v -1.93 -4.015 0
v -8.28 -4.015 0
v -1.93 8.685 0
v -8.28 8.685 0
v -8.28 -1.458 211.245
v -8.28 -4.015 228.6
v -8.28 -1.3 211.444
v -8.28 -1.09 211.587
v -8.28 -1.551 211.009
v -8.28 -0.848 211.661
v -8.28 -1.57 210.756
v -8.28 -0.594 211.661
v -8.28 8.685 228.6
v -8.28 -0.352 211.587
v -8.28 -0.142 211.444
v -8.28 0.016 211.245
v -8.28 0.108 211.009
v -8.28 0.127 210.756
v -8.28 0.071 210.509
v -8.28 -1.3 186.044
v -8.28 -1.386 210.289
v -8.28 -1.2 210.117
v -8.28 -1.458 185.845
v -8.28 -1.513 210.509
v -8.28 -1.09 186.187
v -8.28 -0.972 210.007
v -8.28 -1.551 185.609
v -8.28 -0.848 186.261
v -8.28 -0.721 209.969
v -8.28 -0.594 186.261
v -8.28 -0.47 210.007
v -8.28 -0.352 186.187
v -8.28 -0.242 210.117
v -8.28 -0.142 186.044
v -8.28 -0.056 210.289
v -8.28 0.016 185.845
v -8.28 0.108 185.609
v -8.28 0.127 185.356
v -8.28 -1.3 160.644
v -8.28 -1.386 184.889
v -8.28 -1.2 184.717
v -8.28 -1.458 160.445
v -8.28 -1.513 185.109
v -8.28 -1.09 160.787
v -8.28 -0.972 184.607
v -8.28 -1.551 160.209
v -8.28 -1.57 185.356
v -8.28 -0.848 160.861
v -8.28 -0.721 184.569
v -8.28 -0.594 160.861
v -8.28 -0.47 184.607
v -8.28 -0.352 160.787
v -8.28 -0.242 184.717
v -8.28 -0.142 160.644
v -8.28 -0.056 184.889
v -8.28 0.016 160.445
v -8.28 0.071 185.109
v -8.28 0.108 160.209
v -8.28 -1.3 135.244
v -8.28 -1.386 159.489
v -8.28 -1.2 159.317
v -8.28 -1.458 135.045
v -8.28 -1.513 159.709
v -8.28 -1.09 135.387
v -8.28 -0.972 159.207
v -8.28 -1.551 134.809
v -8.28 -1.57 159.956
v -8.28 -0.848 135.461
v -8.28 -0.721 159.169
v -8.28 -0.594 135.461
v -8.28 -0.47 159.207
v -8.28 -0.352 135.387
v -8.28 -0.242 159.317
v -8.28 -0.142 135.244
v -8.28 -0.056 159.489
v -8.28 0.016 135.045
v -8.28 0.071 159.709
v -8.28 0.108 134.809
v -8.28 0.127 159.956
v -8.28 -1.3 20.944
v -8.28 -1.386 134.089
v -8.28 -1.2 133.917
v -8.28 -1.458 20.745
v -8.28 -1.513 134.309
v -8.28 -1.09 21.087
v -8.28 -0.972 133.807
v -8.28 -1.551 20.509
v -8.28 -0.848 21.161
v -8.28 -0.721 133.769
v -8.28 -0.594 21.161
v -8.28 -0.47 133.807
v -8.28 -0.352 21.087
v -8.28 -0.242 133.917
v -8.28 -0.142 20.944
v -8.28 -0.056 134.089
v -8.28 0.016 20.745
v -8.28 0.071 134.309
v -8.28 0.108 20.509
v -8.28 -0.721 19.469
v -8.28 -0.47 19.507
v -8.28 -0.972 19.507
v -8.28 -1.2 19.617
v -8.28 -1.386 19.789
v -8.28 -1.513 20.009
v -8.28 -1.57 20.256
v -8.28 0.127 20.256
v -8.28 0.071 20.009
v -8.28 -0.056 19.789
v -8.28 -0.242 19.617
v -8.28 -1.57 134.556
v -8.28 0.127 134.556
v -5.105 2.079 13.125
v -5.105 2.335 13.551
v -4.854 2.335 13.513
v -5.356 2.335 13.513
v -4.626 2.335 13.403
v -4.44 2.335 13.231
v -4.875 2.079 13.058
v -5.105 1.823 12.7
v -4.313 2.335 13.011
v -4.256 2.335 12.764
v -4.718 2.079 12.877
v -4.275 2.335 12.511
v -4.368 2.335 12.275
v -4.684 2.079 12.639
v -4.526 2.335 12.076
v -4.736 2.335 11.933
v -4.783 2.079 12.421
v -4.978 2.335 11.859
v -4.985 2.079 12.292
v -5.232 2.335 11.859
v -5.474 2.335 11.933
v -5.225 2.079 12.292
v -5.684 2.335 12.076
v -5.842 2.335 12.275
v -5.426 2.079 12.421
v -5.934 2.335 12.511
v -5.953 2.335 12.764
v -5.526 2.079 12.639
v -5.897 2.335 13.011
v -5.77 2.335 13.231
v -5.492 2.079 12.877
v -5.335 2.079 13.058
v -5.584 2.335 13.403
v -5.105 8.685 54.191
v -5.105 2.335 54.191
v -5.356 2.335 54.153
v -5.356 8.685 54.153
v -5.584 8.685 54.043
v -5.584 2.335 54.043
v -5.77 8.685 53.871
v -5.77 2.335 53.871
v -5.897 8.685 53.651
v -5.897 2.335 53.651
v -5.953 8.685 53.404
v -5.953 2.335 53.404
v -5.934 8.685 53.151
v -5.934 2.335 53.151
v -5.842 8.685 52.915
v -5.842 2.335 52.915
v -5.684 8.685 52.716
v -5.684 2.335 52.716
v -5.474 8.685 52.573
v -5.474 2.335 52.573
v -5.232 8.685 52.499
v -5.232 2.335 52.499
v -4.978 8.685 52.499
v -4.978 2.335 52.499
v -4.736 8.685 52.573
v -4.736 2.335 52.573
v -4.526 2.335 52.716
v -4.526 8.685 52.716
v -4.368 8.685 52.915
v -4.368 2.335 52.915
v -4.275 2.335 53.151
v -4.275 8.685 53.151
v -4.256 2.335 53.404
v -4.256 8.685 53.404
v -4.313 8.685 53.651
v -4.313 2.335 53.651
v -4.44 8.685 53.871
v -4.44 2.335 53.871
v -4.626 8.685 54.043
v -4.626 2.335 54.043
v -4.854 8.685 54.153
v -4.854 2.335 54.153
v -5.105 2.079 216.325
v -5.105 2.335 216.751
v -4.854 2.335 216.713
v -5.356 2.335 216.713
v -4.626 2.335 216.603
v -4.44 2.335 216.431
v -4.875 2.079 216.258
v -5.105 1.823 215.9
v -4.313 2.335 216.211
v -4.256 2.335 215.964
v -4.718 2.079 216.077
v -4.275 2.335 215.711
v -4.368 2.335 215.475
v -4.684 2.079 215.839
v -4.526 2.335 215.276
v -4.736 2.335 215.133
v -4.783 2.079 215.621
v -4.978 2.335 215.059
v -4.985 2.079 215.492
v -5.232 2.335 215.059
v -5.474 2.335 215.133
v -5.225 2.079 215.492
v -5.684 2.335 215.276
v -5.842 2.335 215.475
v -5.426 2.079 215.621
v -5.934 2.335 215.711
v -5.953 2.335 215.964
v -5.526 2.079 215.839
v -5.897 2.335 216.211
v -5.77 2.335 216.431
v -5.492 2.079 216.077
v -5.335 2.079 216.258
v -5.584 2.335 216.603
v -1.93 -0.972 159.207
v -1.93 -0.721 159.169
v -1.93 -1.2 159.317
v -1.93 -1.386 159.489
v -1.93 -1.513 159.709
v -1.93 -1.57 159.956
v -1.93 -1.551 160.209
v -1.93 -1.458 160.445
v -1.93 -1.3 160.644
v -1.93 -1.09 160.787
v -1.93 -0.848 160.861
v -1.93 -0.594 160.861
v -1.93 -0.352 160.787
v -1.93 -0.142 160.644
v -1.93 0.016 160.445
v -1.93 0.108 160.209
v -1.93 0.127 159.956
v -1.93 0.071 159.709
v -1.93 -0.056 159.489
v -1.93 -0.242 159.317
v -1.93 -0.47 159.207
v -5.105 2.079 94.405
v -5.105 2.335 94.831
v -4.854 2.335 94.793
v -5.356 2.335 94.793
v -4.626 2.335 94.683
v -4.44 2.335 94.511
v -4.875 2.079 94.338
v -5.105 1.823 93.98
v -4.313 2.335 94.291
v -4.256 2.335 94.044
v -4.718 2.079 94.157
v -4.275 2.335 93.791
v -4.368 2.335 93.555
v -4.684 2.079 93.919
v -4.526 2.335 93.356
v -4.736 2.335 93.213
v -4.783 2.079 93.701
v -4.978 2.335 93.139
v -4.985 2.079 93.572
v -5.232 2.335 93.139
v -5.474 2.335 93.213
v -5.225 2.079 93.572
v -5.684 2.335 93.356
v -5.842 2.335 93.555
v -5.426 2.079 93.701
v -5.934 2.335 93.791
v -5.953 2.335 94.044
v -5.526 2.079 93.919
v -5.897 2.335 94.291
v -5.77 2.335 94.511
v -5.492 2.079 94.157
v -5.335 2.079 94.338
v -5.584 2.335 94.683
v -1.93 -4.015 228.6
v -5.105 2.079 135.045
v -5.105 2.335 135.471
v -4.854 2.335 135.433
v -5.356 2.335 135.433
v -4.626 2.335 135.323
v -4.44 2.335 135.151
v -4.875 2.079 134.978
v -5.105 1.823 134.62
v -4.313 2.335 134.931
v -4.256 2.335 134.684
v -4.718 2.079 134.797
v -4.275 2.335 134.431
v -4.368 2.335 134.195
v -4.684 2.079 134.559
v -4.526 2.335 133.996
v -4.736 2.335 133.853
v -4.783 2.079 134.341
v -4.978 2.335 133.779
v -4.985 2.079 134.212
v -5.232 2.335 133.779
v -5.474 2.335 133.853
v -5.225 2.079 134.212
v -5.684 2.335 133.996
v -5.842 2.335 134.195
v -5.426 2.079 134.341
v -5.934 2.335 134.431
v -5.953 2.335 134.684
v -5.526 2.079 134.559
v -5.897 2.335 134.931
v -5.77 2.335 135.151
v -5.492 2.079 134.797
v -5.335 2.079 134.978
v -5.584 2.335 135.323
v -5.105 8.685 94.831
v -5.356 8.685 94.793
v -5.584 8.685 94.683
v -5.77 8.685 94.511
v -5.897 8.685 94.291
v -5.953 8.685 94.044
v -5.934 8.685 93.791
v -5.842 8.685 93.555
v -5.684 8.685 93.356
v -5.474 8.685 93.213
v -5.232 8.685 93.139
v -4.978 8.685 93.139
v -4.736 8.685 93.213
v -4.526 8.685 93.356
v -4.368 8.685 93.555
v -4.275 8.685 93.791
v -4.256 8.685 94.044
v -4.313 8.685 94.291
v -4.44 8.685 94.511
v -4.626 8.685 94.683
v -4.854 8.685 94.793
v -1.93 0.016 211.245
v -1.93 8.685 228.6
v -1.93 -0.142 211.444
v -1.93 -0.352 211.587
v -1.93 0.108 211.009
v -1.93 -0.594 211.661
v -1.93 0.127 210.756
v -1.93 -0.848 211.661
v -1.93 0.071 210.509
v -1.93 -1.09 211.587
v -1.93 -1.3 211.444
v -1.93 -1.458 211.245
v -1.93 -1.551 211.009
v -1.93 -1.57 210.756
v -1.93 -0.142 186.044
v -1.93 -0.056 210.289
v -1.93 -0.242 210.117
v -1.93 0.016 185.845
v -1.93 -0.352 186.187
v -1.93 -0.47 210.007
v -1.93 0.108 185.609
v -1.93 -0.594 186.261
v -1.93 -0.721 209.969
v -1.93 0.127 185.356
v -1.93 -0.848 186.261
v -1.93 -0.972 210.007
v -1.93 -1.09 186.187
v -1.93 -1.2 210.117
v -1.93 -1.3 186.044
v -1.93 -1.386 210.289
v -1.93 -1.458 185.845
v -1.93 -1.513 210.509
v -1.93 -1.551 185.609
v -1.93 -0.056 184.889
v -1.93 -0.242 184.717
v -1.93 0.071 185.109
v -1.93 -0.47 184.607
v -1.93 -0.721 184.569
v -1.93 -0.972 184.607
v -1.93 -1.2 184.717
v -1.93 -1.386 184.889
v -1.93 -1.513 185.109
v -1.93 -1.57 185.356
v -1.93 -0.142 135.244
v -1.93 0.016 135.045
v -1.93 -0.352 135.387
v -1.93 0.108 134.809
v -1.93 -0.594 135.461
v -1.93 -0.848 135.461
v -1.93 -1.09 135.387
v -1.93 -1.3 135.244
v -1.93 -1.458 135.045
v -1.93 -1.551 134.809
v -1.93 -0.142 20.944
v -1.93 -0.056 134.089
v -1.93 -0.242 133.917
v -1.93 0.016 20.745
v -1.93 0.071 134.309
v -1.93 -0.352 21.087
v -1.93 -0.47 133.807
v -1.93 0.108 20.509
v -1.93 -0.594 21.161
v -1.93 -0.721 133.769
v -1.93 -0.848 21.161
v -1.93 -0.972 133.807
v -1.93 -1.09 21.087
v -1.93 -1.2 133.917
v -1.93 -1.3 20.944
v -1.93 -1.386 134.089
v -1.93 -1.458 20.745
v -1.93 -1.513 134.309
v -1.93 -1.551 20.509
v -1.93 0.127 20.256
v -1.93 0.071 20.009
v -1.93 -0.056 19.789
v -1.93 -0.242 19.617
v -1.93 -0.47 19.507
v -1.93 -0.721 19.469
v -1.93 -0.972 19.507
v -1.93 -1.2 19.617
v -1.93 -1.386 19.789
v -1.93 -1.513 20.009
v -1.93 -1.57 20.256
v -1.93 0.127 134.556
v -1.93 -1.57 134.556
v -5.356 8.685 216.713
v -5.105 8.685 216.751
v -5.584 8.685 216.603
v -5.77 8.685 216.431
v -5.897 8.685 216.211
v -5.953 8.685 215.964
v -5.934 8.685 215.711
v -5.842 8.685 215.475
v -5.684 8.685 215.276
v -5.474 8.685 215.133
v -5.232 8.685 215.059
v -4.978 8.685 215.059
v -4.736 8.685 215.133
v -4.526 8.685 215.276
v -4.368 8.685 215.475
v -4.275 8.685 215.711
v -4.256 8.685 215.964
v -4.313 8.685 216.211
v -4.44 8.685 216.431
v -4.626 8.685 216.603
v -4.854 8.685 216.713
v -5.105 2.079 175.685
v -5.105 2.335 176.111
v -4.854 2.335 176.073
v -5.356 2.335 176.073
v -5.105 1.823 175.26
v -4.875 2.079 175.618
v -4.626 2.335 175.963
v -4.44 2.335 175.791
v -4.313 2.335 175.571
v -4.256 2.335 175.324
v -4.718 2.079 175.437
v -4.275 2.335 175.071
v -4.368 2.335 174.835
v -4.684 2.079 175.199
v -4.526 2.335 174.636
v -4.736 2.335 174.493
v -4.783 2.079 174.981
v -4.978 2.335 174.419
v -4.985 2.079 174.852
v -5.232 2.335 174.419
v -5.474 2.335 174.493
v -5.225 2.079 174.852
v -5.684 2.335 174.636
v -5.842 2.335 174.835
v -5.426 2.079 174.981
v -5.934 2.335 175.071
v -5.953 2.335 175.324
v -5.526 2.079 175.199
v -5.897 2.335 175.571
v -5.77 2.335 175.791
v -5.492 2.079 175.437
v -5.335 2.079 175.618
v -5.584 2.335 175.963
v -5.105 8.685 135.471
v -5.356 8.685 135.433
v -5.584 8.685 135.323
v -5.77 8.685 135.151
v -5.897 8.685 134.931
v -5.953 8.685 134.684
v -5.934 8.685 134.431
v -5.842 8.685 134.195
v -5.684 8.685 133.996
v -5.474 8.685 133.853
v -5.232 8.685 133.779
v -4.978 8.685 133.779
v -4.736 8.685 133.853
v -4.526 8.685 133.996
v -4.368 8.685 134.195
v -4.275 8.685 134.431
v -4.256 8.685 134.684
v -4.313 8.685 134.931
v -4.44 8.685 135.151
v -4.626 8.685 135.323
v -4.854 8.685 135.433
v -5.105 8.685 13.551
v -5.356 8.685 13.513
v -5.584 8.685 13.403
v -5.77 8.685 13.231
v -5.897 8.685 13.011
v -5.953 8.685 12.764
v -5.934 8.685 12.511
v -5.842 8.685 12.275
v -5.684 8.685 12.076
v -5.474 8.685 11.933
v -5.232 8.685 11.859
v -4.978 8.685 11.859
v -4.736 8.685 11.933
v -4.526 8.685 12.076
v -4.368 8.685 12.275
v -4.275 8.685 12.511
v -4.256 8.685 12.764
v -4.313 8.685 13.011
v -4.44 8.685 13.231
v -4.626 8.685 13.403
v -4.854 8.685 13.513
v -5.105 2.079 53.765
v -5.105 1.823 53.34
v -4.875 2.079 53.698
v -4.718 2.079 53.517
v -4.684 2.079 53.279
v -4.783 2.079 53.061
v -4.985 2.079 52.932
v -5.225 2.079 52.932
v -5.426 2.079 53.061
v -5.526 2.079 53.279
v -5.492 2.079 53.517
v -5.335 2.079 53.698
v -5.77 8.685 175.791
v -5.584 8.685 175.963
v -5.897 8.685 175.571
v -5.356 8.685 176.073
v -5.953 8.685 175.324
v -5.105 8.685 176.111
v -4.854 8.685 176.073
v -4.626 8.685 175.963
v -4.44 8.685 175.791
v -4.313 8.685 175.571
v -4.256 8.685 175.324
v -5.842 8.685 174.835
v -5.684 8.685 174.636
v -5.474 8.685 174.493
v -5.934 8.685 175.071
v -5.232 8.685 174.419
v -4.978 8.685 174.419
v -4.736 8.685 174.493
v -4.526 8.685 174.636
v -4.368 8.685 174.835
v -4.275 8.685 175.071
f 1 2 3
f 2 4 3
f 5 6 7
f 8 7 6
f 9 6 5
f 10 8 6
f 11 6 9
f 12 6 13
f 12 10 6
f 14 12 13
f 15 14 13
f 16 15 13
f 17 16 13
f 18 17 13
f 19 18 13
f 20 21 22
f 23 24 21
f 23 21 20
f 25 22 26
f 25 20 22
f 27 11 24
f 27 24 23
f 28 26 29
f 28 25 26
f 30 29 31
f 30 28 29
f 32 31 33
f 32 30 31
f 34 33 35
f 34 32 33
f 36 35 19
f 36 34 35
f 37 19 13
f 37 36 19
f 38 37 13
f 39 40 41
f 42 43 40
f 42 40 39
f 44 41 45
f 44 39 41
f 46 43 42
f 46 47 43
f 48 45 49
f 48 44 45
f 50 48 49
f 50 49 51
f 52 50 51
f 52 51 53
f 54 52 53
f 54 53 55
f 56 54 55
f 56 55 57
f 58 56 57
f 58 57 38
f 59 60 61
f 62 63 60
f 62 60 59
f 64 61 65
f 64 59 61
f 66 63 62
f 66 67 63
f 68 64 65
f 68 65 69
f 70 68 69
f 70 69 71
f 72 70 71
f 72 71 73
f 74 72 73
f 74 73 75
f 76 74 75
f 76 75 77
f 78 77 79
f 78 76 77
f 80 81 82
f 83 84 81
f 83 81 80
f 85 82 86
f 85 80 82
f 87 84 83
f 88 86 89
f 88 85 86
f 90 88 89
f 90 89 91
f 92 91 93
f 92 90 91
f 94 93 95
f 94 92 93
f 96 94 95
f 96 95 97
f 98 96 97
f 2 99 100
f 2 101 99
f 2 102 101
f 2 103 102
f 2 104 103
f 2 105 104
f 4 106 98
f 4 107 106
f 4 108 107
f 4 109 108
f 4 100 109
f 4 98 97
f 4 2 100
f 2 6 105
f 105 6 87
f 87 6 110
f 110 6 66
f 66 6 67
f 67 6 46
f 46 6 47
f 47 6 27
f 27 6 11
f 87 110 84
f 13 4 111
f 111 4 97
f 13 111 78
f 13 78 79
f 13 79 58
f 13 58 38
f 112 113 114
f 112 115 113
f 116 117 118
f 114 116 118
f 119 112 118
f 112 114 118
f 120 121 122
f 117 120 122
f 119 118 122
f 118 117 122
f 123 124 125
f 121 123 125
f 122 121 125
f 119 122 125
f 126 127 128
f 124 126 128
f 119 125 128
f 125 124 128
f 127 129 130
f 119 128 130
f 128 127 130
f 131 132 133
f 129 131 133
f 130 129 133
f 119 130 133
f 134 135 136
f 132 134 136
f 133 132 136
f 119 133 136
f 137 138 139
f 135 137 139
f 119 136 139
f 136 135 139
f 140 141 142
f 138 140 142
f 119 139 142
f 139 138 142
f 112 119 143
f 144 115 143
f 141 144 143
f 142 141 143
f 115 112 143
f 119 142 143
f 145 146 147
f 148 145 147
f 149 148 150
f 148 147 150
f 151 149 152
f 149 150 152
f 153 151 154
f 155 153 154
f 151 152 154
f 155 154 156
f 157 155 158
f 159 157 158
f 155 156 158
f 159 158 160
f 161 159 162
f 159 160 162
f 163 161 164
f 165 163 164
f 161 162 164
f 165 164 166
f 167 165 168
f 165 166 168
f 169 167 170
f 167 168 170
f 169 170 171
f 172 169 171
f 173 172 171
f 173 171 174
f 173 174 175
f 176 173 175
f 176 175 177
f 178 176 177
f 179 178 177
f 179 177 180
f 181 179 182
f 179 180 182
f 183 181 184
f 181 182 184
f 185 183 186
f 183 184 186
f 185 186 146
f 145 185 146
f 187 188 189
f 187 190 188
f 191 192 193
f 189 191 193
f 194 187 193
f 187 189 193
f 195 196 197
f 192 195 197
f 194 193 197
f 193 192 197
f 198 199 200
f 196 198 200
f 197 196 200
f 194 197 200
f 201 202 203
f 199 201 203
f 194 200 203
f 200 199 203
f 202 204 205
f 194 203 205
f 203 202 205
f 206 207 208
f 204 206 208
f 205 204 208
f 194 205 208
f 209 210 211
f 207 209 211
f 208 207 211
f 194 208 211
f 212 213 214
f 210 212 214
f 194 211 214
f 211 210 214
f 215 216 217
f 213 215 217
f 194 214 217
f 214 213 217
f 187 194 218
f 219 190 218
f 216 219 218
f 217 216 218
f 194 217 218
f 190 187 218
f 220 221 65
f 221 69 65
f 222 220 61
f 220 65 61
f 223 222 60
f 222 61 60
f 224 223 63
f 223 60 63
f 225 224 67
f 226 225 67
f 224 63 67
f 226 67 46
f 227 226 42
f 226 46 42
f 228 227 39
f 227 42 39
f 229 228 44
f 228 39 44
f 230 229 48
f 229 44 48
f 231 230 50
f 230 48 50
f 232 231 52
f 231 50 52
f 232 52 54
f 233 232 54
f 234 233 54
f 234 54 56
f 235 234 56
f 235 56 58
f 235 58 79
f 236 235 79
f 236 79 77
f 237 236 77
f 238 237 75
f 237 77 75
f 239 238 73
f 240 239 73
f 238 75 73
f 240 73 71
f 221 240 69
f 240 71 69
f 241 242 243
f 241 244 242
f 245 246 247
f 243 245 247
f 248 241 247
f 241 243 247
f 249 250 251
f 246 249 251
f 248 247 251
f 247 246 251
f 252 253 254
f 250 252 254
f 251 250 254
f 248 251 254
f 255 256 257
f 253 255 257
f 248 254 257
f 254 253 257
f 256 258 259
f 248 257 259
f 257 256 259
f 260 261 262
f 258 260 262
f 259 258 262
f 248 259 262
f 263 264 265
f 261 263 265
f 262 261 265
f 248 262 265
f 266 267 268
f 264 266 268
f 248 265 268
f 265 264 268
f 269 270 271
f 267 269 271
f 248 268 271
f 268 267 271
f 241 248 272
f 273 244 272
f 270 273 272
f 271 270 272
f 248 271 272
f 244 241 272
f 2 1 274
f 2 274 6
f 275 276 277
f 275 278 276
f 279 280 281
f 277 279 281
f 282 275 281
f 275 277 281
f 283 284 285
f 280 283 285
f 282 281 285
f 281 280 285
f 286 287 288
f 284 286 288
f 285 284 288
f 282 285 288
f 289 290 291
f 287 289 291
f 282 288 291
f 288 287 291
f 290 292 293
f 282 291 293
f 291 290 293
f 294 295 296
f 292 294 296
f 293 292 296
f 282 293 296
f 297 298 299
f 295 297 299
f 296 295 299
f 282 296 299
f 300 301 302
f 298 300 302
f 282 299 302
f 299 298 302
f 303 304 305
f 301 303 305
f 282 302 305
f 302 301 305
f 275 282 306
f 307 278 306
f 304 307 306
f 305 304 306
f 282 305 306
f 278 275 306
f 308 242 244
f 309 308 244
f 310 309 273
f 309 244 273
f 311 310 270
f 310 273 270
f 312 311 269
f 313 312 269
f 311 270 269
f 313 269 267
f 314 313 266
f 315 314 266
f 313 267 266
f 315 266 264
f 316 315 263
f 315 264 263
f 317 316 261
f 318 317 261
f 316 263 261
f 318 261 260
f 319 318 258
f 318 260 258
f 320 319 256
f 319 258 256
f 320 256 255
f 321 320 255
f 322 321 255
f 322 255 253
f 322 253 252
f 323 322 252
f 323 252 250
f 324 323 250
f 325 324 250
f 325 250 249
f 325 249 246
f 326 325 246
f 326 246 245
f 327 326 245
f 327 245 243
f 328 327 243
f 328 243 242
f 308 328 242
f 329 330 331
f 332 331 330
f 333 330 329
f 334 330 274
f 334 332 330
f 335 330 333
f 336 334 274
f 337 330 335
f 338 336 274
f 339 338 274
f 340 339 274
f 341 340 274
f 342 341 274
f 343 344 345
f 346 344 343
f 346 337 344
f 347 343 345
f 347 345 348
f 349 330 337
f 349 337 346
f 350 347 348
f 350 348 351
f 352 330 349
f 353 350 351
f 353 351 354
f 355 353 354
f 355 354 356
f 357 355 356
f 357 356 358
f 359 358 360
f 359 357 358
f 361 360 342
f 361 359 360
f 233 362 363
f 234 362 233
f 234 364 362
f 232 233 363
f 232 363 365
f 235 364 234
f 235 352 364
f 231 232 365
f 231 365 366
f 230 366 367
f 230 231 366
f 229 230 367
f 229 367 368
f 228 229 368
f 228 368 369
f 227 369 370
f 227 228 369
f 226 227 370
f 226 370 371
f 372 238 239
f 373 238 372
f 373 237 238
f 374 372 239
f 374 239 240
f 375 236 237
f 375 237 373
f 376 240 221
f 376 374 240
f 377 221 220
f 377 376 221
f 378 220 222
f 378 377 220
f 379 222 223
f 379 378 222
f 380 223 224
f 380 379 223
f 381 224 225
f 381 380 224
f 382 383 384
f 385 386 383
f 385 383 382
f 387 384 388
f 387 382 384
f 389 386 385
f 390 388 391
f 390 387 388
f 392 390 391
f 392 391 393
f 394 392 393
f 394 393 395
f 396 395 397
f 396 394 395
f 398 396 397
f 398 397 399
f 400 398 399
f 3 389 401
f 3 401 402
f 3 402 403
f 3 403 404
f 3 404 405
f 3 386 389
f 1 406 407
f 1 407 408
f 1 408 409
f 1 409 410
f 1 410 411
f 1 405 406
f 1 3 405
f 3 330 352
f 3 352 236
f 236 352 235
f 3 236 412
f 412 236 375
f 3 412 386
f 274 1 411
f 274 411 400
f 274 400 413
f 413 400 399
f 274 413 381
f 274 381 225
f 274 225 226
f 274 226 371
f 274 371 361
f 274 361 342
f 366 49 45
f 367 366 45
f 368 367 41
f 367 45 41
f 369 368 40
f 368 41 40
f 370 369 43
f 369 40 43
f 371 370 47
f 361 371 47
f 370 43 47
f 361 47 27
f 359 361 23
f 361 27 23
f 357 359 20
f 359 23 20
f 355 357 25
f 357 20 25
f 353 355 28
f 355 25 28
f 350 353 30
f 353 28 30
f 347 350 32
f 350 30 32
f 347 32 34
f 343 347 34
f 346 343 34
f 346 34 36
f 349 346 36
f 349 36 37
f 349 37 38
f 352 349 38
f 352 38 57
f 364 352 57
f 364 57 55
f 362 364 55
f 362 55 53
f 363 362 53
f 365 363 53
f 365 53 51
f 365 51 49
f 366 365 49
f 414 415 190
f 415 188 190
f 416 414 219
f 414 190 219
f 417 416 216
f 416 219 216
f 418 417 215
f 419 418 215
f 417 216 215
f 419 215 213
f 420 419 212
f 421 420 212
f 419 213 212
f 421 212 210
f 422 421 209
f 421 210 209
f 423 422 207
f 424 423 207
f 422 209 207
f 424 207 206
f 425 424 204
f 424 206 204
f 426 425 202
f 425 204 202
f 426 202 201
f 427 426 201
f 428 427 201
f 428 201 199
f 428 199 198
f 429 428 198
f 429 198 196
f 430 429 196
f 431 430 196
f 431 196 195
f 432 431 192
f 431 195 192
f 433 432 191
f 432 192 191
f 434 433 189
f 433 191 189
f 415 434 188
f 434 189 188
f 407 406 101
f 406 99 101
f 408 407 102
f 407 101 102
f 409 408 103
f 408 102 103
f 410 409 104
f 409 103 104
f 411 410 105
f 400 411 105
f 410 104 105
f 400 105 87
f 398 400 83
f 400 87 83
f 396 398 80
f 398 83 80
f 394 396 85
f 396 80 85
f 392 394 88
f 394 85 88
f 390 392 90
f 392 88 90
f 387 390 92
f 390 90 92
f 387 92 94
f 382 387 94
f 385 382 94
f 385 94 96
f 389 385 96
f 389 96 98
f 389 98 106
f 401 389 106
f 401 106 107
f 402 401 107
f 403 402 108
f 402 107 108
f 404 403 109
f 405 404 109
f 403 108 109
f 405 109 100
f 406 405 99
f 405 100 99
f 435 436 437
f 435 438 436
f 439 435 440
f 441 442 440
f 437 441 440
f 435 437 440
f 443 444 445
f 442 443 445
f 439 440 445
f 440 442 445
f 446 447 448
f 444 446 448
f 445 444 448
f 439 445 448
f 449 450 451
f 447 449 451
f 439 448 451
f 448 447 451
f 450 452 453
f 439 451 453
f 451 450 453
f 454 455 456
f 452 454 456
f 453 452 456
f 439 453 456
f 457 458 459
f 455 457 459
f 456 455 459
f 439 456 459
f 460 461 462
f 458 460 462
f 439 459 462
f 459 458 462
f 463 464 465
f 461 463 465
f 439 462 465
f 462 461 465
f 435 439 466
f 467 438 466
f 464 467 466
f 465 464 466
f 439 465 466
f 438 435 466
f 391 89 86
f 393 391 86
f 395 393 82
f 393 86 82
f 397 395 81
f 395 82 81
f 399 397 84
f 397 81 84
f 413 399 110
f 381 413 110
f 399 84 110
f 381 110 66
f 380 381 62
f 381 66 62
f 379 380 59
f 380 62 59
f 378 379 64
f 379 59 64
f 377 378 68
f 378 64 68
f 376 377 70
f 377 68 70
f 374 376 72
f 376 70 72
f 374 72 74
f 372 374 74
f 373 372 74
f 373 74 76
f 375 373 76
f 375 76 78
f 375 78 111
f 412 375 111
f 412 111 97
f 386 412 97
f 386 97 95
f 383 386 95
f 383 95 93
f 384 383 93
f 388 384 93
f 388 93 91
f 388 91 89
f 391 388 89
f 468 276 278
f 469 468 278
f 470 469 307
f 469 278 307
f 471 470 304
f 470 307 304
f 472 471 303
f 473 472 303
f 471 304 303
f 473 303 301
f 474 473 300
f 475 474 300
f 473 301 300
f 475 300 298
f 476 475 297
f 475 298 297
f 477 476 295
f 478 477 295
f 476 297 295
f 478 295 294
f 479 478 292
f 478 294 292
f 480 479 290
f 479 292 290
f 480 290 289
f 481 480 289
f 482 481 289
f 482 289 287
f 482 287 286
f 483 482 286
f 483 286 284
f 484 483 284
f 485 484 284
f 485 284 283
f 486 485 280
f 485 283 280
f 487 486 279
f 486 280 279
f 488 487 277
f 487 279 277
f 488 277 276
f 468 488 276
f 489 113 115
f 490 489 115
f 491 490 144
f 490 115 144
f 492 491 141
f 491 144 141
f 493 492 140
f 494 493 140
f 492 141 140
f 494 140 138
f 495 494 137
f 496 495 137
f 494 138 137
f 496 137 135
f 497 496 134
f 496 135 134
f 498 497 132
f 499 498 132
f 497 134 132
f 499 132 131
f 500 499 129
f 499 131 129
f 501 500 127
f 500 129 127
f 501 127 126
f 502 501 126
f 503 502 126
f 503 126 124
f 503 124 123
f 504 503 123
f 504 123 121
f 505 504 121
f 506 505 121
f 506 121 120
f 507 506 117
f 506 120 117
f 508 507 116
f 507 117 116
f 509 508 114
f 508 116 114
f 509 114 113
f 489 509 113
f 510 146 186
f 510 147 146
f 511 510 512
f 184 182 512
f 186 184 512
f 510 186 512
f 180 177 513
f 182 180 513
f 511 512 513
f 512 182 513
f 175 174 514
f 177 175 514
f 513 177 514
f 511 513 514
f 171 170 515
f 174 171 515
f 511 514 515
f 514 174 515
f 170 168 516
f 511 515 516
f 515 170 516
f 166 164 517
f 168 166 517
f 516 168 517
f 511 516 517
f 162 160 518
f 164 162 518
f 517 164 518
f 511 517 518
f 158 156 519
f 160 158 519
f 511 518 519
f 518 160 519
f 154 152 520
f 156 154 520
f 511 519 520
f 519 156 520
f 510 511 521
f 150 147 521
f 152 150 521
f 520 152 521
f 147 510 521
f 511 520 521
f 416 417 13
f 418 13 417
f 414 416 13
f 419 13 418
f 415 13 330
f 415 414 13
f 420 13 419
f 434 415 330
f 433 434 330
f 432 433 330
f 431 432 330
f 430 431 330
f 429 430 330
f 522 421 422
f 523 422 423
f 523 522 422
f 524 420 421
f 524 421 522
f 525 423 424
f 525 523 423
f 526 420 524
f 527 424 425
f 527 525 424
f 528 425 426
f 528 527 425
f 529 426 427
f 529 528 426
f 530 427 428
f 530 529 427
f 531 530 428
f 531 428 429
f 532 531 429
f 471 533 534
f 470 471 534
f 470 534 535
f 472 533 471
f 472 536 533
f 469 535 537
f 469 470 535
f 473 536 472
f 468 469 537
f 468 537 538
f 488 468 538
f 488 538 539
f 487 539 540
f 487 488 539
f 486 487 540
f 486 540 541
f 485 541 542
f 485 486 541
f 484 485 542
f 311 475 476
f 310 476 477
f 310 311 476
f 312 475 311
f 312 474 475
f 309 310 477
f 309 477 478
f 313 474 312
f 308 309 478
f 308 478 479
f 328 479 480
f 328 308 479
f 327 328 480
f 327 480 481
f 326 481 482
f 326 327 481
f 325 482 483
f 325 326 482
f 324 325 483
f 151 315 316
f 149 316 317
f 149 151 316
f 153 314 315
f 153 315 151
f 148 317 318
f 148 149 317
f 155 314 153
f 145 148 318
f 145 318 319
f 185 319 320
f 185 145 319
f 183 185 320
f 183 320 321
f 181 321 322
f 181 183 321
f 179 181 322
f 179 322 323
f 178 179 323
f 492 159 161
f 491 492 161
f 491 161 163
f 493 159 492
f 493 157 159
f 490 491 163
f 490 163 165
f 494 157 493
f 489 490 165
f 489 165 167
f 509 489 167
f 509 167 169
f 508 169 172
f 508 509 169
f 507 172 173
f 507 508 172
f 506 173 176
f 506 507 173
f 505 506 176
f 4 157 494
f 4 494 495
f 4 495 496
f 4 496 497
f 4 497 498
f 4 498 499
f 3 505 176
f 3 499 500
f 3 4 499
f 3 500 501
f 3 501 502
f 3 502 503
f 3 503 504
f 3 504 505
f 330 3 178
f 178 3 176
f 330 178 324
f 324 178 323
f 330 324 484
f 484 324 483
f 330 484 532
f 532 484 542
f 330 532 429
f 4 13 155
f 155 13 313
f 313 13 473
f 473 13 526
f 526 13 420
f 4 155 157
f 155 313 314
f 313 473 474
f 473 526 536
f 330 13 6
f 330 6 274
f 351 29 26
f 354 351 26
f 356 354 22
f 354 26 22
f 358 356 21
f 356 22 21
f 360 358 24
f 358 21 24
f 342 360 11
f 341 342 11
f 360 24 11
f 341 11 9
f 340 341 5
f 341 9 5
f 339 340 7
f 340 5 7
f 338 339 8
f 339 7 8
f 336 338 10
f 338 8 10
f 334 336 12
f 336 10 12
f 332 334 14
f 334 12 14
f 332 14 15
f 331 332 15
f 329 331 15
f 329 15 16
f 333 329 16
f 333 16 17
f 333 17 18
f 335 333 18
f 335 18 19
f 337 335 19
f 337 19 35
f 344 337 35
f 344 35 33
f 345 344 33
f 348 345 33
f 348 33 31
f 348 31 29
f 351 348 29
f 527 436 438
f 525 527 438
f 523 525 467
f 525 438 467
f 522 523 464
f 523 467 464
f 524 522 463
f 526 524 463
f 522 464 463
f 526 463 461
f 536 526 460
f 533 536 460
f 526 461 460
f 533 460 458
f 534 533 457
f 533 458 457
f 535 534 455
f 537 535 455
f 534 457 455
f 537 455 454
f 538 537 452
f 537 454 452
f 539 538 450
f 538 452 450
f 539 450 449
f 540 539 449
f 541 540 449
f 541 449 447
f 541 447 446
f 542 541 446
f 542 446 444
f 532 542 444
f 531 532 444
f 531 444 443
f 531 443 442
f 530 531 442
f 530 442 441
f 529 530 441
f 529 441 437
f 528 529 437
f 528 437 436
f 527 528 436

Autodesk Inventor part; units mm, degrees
ref_plane "YZ Plane" through (0, 0, 0) normal (1, 0, 0) x (0, 1, 0)
ref_plane "XZ Plane" through (0, 0, 0) normal (0, 1, 0) x (-1, 0, 0)
ref_plane "XY Plane" through (0, 0, 0) normal (0, 0, 1) x (1, 0, 0)
sketch "Sketch2" plane through (0, 0, 0) normal (0, 0, 1) x (1, 0, 0)
  line L0 (-8.2799, 8.6846) -> (-1.9299, 8.6846)
  line L1 (-1.9299, 8.6846) -> (-1.9299, -4.0154)
  line L2 (-1.9299, -4.0154) -> (-8.2799, -4.0154)
  line L3 (-8.2799, -4.0154) -> (-8.2799, 8.6846)
  point P0 (0, 0)
  dimension "d3" = 6.35
  dimension "d5" = 12.7
extrude "Extrusion1" add sketch "Sketch2" along normal blind 228.6
sketch "Sketch3" plane through (-1.9299, -4.0154, 0) normal (1, 0, 0) x (0, 0, -1)
  point P0 (-228.6, 12.7)
  point P1 (0, 4.0154)
  point P2 (-210.82, 3.2944)
  point P3 (-20.32, 3.2944)
  dimension "d8" = 9.4056
  dimension "d9" = 17.78
  dimension "d60" = 208.28
  dimension "d61" = 9.4056
hole "Hole1" at (-1.9299, -0.7211, 210.82) direction (-1, 0, 0) diameter 1.7018 end through all
pattern_linear "Rectangular Pattern1" count 4 spacing 25.4 along (0, 0, -1) of "Hole1"
hole "Hole5" at (-1.9299, -0.7211, 20.32) direction (-1, 0, 0) diameter 1.7018 end through all
sketch "Sketch7" plane through (-8.2799, 8.6846, 0) normal (0, 1, 0) x (1, 0, 0)
  point P0 (6.35, -228.6)
  point P1 (8.2799, 0)
  point P2 (3.175, -215.9)
  dimension "d69" = 12.7
  dimension "d70" = 3.175
hole "Hole6" at (-5.1049, 8.6846, 215.9) direction (0, -1, 0) diameter 1.7018 depth 6.35 tip angle 118
pattern_linear "Rectangular Pattern5" count 6 spacing 40.64 along (0, 0, -1) of "Hole6"
properties part number "mounting rail 9.0 x.250 x.500-B" material "Gold"
